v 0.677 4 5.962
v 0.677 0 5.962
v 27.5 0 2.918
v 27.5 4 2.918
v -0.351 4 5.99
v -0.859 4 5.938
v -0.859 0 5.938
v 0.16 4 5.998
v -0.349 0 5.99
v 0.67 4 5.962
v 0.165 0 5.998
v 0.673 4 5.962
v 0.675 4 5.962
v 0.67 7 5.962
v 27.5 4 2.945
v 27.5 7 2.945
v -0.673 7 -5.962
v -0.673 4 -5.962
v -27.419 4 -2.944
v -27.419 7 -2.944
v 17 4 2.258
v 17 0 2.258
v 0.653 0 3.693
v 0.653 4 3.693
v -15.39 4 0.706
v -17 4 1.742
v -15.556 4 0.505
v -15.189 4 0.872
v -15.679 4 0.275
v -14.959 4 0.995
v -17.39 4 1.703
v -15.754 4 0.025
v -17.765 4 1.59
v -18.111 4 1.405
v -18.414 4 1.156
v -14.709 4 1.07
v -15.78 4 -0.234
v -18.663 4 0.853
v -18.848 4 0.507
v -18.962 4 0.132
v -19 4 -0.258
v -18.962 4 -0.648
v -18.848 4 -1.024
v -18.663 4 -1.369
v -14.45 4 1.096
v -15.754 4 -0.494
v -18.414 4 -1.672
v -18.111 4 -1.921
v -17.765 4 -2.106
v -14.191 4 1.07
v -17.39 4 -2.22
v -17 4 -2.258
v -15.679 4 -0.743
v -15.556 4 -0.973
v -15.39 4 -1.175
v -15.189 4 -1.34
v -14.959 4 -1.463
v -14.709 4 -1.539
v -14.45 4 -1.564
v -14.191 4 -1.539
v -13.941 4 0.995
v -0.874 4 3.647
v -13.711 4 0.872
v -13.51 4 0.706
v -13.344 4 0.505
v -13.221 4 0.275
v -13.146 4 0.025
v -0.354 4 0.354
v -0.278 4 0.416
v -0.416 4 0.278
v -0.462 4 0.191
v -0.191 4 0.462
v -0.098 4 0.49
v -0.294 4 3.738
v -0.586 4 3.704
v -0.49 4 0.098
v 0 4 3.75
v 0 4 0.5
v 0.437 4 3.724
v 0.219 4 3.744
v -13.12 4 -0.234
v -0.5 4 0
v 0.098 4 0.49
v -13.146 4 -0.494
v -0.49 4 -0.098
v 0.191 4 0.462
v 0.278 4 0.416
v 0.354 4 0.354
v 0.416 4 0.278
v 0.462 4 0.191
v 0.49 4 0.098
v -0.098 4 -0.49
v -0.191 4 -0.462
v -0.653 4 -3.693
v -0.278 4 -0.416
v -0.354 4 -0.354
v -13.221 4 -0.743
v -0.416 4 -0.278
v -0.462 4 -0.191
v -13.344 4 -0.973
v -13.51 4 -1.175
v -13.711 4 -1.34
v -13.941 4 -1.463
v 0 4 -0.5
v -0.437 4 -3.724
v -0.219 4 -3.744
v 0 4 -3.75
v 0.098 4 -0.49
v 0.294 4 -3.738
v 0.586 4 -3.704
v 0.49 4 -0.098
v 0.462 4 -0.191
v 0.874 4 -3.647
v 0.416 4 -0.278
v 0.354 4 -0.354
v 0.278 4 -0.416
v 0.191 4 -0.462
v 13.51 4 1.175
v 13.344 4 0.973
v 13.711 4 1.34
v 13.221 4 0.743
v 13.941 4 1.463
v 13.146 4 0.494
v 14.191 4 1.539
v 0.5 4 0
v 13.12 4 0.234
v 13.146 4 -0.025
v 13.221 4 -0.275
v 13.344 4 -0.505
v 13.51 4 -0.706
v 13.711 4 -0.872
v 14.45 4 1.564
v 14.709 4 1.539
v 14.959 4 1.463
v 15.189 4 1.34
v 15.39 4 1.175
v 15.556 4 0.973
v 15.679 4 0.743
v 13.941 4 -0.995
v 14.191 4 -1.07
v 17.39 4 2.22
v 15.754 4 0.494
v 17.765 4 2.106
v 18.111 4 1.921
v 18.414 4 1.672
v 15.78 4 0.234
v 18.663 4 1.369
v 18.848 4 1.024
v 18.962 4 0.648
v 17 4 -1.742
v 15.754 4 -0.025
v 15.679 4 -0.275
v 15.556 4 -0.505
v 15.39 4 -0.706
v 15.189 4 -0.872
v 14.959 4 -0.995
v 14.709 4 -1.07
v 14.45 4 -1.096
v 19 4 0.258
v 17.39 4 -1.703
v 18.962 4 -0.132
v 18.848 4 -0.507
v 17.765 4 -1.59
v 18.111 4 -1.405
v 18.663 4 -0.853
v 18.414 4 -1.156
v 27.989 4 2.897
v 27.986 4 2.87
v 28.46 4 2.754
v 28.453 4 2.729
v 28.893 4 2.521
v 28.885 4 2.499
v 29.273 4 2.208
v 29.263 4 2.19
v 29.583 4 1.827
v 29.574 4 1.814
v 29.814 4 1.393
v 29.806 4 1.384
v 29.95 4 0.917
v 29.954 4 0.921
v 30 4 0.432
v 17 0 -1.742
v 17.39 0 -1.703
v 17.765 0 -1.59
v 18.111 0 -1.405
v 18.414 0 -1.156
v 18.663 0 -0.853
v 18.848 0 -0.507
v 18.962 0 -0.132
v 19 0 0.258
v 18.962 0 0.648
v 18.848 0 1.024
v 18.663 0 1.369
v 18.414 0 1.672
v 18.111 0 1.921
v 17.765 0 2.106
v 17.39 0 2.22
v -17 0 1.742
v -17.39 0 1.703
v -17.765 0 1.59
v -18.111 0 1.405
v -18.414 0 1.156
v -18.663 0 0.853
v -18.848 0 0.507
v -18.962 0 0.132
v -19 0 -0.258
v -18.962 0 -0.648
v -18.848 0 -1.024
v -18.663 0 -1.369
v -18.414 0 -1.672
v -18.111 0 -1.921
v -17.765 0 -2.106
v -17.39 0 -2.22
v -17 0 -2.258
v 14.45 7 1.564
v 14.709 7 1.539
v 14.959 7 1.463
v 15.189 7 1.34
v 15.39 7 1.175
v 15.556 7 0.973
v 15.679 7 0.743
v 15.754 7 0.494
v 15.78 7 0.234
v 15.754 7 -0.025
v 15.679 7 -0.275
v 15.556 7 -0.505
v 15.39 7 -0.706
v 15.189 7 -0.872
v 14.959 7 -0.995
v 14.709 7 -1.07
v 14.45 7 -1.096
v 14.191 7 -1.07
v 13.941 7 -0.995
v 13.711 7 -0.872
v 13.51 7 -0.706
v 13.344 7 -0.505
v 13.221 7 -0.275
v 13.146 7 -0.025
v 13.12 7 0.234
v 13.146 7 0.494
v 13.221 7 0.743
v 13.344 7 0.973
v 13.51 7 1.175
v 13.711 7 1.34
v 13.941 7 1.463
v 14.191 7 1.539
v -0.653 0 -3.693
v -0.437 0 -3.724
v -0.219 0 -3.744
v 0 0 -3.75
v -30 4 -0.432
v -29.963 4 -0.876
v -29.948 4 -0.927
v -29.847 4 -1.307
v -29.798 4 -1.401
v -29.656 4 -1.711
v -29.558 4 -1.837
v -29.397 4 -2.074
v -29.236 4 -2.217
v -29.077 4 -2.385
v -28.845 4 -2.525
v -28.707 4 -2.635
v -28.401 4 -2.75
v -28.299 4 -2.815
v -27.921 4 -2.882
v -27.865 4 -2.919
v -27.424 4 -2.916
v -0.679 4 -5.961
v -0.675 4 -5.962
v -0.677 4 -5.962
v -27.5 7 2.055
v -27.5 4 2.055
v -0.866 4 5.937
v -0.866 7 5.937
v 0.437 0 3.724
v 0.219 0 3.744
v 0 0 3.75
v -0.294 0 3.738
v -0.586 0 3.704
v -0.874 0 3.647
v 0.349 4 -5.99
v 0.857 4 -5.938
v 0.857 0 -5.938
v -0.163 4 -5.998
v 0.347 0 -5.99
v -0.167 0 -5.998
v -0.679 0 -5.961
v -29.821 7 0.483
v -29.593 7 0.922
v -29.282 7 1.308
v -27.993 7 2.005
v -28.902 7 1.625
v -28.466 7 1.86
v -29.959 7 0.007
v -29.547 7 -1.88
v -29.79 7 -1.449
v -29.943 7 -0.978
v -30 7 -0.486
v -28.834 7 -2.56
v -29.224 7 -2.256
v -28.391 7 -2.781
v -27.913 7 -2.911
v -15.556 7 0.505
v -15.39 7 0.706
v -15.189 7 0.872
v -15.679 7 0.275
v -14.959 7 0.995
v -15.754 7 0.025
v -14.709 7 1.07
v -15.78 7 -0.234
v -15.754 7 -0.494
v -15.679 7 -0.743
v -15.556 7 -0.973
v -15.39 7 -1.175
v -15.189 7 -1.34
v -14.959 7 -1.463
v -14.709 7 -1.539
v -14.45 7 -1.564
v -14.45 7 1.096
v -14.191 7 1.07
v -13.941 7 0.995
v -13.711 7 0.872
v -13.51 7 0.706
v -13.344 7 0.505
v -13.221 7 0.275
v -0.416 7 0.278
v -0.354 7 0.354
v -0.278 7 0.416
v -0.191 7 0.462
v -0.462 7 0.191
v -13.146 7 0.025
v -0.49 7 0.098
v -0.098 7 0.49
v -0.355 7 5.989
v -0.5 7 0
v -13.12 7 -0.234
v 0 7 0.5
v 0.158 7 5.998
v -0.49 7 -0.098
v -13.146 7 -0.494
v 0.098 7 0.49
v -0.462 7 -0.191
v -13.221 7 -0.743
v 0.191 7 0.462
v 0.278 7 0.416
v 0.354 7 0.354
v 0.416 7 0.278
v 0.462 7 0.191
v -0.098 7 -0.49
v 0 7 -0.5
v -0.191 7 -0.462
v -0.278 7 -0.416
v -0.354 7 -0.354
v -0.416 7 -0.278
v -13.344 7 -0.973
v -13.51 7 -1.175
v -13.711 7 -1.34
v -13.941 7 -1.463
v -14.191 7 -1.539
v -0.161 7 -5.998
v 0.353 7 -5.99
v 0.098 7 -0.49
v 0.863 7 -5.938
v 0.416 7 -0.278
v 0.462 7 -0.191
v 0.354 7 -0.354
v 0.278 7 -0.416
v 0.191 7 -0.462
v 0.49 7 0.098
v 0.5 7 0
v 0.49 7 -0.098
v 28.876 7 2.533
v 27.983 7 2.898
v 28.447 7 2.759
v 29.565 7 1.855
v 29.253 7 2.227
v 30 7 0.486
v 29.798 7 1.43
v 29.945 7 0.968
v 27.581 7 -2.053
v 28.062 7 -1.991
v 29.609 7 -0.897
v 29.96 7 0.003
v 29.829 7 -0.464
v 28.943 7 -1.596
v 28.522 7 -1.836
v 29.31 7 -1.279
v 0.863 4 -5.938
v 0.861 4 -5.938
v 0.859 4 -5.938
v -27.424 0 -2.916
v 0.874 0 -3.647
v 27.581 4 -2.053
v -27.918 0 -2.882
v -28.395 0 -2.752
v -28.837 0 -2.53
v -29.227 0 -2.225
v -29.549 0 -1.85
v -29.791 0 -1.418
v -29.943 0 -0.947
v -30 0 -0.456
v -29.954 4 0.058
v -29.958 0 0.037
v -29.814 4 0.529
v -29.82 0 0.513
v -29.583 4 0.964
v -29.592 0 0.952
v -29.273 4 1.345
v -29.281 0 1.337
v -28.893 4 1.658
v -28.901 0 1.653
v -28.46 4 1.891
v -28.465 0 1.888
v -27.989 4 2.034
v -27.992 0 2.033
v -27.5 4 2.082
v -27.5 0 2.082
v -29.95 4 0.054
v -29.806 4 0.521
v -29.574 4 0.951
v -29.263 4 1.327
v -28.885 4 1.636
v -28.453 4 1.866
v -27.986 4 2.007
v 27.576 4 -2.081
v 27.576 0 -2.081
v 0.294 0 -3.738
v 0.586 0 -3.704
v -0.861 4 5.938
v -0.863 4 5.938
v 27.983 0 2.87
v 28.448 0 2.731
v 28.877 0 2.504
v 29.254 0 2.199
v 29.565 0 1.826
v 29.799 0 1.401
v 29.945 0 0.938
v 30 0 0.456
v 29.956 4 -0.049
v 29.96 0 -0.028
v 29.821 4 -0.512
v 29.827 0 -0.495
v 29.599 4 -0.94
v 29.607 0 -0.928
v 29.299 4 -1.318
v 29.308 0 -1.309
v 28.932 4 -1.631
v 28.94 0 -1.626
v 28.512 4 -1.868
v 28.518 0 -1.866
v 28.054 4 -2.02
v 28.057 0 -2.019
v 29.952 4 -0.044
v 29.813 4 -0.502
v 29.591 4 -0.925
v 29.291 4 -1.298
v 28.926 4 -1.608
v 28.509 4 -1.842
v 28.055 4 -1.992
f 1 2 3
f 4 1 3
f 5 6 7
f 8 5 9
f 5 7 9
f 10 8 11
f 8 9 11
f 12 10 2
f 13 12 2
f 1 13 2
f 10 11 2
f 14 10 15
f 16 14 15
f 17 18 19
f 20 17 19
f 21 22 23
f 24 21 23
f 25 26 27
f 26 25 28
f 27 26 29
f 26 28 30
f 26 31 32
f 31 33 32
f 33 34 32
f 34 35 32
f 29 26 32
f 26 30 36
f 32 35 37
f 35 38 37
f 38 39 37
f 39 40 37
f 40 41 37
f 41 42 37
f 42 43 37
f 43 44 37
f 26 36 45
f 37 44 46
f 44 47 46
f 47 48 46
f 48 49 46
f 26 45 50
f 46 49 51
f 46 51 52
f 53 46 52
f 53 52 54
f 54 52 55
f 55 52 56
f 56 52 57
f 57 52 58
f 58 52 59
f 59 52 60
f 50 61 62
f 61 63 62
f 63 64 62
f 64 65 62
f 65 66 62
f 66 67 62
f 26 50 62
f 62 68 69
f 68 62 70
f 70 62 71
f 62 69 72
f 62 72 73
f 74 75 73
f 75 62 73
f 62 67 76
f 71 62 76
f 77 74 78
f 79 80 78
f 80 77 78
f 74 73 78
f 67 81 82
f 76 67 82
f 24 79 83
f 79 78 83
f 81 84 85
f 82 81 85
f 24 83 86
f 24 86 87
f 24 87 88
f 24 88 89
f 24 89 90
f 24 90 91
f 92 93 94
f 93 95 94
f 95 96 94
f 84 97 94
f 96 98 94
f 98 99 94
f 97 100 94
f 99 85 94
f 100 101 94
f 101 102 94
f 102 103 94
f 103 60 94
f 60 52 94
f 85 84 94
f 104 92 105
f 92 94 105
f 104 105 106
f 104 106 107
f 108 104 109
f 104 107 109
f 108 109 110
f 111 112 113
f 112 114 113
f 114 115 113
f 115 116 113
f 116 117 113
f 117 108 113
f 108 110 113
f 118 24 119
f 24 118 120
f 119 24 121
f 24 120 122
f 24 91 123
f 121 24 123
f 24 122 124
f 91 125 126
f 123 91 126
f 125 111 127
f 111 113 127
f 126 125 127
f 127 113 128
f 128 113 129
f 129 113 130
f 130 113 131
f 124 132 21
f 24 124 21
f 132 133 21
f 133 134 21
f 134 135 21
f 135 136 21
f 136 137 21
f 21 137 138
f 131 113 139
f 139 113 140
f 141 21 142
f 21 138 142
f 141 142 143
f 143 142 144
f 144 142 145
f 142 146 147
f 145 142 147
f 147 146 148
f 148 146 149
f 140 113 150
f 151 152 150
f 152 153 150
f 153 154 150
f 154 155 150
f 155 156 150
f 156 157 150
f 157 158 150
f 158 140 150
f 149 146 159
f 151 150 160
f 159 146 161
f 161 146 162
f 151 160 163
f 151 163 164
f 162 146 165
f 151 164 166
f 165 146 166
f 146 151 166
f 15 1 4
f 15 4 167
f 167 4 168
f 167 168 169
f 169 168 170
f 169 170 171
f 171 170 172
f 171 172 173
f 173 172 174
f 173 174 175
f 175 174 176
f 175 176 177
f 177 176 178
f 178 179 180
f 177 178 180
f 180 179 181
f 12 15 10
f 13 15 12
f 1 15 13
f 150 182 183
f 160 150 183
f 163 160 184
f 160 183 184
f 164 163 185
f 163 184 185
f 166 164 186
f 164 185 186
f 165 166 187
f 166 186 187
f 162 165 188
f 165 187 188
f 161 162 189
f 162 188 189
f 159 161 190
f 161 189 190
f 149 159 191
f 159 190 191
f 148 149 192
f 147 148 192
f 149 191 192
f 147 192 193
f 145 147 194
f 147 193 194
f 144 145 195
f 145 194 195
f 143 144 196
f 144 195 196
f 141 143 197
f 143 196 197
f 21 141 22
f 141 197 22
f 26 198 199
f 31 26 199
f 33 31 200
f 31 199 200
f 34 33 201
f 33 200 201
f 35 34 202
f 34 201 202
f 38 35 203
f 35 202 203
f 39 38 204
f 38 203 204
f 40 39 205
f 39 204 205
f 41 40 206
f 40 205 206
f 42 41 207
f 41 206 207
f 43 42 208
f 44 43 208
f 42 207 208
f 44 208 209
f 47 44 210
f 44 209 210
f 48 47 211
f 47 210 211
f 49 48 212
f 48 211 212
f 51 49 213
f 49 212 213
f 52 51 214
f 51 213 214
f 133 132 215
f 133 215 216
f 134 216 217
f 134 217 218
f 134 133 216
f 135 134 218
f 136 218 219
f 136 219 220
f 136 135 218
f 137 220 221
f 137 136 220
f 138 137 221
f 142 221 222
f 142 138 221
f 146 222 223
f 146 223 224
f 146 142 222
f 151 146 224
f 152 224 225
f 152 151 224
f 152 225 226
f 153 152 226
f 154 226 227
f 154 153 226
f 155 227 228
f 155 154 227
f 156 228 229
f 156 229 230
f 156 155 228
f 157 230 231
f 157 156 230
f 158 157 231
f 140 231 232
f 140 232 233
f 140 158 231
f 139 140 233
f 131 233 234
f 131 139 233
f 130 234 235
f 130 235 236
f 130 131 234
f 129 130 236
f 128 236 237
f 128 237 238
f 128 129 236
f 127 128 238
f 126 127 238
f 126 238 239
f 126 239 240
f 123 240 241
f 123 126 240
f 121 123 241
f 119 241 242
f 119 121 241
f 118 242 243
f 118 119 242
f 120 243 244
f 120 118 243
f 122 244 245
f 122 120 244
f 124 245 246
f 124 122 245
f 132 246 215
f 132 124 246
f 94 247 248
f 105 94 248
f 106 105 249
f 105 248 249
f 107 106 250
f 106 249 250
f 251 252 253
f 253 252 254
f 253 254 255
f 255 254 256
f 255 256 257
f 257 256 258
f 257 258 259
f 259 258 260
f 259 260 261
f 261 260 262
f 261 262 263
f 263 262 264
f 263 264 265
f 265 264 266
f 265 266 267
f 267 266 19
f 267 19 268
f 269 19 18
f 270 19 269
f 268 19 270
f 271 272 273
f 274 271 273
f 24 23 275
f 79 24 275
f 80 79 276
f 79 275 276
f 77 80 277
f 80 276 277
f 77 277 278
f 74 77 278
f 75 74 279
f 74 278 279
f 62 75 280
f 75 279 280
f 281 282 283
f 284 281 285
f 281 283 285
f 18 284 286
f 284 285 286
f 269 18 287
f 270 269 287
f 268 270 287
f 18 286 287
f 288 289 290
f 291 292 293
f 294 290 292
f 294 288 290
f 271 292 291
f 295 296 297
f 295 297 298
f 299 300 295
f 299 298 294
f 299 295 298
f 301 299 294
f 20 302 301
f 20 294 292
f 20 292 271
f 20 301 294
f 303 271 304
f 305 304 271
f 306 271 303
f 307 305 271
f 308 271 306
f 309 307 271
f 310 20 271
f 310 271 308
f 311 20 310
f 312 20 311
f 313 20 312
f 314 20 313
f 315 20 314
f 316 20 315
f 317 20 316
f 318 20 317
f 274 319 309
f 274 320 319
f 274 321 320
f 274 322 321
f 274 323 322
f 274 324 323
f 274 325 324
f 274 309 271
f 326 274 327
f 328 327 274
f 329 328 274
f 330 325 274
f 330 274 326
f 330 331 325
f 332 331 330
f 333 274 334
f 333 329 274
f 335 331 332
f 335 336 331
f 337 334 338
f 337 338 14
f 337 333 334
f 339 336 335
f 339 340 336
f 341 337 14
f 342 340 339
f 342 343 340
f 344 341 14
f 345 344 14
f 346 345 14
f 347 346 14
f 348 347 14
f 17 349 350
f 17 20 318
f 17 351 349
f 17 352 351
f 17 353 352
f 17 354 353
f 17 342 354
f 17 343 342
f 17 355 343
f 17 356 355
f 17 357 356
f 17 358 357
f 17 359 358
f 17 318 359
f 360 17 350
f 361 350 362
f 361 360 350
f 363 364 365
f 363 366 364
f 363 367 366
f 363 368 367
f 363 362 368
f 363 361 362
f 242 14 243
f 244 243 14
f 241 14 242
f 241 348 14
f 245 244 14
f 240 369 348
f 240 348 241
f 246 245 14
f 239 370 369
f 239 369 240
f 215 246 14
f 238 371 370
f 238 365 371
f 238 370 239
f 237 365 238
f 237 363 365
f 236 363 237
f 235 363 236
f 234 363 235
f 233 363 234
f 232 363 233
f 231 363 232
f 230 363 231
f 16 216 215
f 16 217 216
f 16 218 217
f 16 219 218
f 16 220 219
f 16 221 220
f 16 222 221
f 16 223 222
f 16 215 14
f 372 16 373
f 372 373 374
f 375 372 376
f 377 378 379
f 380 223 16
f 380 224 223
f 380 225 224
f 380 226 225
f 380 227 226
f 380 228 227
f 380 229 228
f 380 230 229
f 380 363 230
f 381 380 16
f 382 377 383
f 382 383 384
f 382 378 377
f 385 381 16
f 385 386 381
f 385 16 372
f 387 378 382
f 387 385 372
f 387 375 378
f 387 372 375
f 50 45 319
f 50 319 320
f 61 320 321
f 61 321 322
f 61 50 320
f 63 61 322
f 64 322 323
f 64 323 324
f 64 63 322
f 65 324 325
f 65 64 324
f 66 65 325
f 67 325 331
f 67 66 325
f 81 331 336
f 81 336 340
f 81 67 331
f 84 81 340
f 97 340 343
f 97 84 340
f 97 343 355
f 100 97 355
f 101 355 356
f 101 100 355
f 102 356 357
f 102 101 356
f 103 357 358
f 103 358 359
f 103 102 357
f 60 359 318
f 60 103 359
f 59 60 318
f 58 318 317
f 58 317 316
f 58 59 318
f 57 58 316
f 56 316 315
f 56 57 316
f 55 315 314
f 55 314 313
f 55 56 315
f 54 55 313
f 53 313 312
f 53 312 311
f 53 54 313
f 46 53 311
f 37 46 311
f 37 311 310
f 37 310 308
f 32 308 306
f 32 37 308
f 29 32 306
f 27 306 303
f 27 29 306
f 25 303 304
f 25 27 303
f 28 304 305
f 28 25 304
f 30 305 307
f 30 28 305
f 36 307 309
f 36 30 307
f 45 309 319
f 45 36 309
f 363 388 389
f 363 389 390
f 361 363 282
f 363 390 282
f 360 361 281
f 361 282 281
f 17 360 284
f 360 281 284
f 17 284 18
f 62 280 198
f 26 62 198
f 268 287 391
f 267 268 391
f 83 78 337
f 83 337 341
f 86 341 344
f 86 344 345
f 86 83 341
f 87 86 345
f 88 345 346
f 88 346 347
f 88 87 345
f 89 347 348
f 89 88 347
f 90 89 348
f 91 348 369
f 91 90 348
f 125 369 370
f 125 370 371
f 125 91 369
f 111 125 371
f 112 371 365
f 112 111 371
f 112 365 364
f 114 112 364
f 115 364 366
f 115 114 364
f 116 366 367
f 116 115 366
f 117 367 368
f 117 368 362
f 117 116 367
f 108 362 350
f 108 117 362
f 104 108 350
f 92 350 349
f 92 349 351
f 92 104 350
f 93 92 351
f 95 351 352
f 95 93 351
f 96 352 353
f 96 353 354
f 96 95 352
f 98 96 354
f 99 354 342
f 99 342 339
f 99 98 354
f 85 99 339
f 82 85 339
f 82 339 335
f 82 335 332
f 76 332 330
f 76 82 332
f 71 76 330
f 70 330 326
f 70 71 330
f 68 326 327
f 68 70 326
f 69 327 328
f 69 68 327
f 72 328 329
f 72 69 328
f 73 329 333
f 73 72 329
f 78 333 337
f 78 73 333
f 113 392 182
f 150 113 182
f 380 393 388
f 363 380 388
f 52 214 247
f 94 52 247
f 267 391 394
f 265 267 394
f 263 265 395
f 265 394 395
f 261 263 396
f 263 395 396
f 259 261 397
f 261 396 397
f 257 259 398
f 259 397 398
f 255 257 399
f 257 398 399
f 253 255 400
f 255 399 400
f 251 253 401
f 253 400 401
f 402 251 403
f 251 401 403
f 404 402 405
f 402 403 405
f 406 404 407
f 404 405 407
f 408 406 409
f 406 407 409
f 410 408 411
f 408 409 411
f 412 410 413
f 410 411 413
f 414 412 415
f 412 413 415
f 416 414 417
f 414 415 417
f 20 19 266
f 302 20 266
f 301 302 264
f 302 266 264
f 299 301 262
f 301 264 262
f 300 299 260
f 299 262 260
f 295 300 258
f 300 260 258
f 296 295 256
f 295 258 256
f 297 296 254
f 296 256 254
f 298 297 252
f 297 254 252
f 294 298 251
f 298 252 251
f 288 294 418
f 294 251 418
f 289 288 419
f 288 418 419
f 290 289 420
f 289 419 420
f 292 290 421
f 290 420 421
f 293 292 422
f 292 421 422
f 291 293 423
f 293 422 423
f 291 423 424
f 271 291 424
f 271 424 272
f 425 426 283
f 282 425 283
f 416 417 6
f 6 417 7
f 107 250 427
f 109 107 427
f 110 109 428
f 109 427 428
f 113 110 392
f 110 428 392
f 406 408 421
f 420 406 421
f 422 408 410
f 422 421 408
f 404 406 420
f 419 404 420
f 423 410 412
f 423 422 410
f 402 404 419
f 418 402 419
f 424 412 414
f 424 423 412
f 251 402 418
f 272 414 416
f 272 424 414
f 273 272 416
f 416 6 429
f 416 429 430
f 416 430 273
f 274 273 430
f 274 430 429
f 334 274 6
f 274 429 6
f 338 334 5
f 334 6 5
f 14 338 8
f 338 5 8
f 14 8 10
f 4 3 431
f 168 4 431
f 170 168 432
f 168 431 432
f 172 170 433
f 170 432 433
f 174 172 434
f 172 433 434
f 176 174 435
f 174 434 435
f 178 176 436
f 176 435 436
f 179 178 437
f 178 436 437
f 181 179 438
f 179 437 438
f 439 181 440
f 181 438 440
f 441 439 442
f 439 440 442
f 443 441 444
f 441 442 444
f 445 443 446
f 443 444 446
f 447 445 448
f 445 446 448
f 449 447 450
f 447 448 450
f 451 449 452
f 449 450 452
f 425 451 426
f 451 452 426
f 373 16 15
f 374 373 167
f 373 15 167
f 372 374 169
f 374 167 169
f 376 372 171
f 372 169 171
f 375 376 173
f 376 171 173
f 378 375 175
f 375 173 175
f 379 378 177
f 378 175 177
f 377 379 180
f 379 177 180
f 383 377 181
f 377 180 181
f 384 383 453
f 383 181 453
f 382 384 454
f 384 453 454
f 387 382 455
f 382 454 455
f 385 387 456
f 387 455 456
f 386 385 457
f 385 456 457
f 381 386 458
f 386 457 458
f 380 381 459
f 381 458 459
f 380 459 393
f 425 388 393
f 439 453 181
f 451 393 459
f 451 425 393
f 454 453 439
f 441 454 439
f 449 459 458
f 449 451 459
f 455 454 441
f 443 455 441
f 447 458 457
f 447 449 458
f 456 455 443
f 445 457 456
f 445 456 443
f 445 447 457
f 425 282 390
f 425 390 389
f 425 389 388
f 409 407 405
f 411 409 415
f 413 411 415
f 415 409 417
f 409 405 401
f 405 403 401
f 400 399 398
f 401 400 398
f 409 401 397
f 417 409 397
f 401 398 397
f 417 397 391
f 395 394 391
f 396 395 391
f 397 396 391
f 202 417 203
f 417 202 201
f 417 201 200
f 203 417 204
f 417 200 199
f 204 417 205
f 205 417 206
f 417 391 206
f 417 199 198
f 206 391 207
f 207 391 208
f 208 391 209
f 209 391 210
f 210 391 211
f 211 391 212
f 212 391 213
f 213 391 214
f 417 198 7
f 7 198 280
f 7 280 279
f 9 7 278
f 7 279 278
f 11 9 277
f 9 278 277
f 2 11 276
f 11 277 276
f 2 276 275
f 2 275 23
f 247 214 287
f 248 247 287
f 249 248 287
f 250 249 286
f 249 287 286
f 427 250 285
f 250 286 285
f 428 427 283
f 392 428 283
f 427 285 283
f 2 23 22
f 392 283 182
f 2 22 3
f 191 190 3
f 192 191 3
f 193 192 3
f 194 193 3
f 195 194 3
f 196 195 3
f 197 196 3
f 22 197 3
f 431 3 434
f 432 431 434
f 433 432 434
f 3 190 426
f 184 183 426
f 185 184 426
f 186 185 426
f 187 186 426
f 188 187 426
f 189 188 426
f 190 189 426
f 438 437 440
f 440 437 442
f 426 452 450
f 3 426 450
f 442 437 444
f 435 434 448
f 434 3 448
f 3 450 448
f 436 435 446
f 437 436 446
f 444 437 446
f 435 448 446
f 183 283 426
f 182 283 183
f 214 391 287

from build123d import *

# Parameters (mm, degrees)
BOSS_EXTRUDE2_DEPTH = 4
SKETCH2_R           = 0.5
SKETCH2_R_2         = 1.33
BOSS_EXTRUDE5_DEPTH = 3


with BuildPart() as part:
    # Sketch1 → Boss-Extrude2 (new body)
    with BuildSketch(Plane(origin=(0, 0, 0), x_dir=(1, 0, 0), z_dir=(0, 1, 0))):
        with BuildLine():
            ThreePointArc((27.5, -2.917608197), (29.999711791, -0.455568202), (27.575911257, 2.081239034))
            Line((27.575911257, 2.081239034), (0.857295011, 5.938437948))
            ThreePointArc((0.857295011, 5.938437948), (0.090022516, 5.999324624), (-0.678731386, 5.961486703))
            Line((-0.678731386, 5.961486703), (-27.424088743, 2.916455427))
            ThreePointArc((-27.424088743, 2.916455427), (-29.999711791, 0.455568202), (-27.5, -2.082391803))
            Line((-27.5, -2.082391803), (-0.859435998, -5.938128473))
            ThreePointArc((-0.859435998, -5.938128473), (-0.092185505, -5.999291778), (0.676581989, -5.961731025))
            Line((0.676581989, -5.961731025), (27.5, -2.917608197))
        make_face()
        with BuildLine():
            ThreePointArc((-17, -1.741842206), (-19, 0.258157794), (-17, 2.258157794))
            Line((-17, 2.258157794), (-0.65313587, 3.692683785))
            ThreePointArc((-0.65313587, 3.692683785), (-0.327822976, 3.735643465), (0, 3.75))
            ThreePointArc((0, 3.75), (0.43991732, 3.724106974), (0.873759552, 3.646785467))
            Line((0.873759552, 3.646785467), (17, 1.741842206))
            ThreePointArc((17, 1.741842206), (19, -0.258157794), (17, -2.258157794))
            Line((17, -2.258157794), (0.65313587, -3.692683785))
            ThreePointArc((0.65313587, -3.692683785), (0.327822976, -3.735643465), (0, -3.75))
            ThreePointArc((0, -3.75), (-0.43991732, -3.724106974), (-0.873759552, -3.646785467))
            Line((-0.873759552, -3.646785467), (-17, -1.741842206))
        make_face(mode=Mode.SUBTRACT)
    extrude(amount=BOSS_EXTRUDE2_DEPTH)

    # Sketch2 → Boss-Extrude5 (add)
    with BuildSketch(Plane(origin=(0, 4, 0), x_dir=(1, 0, 0), z_dir=(0, 1, 0))):
        with BuildLine():
            Line((27.580974078, 2.053213999), (0.863235763, 5.937577285))
            ThreePointArc((0.863235763, 5.937577285), (0.096028041, 5.999231502), (-0.6727599, 5.962163543))
            Line((-0.6727599, 5.962163543), (-27.419025922, 2.944162592))
            ThreePointArc((-27.419025922, 2.944162592), (-29.999672052, 0.485966647), (-27.5, -2.054525704))
            Line((-27.5, -2.054525704), (-0.865519194, -5.93724486))
            ThreePointArc((-0.865519194, -5.93724486), (-0.09833524, -5.999194128), (0.6704669, -5.962421835))
            Line((0.6704669, -5.962421835), (27.5, -2.945474296))
            ThreePointArc((27.5, -2.945474296), (29.999672052, -0.485966647), (27.580974078, 2.053213999))
        make_face()
        with Locations(Location((0, 0, 0), (0, 0, 270))):
            Circle(SKETCH2_R, mode=Mode.SUBTRACT)
        with Locations(Location((-14.45, 0.234076494, 0), (0, 0, 270))):
            Circle(SKETCH2_R_2, mode=Mode.SUBTRACT)
        with Locations(Location((14.45, -0.234076494, 0), (0, 0, 270))):
            Circle(SKETCH2_R_2, mode=Mode.SUBTRACT)
    extrude(amount=BOSS_EXTRUDE5_DEPTH)


solid = part.part
